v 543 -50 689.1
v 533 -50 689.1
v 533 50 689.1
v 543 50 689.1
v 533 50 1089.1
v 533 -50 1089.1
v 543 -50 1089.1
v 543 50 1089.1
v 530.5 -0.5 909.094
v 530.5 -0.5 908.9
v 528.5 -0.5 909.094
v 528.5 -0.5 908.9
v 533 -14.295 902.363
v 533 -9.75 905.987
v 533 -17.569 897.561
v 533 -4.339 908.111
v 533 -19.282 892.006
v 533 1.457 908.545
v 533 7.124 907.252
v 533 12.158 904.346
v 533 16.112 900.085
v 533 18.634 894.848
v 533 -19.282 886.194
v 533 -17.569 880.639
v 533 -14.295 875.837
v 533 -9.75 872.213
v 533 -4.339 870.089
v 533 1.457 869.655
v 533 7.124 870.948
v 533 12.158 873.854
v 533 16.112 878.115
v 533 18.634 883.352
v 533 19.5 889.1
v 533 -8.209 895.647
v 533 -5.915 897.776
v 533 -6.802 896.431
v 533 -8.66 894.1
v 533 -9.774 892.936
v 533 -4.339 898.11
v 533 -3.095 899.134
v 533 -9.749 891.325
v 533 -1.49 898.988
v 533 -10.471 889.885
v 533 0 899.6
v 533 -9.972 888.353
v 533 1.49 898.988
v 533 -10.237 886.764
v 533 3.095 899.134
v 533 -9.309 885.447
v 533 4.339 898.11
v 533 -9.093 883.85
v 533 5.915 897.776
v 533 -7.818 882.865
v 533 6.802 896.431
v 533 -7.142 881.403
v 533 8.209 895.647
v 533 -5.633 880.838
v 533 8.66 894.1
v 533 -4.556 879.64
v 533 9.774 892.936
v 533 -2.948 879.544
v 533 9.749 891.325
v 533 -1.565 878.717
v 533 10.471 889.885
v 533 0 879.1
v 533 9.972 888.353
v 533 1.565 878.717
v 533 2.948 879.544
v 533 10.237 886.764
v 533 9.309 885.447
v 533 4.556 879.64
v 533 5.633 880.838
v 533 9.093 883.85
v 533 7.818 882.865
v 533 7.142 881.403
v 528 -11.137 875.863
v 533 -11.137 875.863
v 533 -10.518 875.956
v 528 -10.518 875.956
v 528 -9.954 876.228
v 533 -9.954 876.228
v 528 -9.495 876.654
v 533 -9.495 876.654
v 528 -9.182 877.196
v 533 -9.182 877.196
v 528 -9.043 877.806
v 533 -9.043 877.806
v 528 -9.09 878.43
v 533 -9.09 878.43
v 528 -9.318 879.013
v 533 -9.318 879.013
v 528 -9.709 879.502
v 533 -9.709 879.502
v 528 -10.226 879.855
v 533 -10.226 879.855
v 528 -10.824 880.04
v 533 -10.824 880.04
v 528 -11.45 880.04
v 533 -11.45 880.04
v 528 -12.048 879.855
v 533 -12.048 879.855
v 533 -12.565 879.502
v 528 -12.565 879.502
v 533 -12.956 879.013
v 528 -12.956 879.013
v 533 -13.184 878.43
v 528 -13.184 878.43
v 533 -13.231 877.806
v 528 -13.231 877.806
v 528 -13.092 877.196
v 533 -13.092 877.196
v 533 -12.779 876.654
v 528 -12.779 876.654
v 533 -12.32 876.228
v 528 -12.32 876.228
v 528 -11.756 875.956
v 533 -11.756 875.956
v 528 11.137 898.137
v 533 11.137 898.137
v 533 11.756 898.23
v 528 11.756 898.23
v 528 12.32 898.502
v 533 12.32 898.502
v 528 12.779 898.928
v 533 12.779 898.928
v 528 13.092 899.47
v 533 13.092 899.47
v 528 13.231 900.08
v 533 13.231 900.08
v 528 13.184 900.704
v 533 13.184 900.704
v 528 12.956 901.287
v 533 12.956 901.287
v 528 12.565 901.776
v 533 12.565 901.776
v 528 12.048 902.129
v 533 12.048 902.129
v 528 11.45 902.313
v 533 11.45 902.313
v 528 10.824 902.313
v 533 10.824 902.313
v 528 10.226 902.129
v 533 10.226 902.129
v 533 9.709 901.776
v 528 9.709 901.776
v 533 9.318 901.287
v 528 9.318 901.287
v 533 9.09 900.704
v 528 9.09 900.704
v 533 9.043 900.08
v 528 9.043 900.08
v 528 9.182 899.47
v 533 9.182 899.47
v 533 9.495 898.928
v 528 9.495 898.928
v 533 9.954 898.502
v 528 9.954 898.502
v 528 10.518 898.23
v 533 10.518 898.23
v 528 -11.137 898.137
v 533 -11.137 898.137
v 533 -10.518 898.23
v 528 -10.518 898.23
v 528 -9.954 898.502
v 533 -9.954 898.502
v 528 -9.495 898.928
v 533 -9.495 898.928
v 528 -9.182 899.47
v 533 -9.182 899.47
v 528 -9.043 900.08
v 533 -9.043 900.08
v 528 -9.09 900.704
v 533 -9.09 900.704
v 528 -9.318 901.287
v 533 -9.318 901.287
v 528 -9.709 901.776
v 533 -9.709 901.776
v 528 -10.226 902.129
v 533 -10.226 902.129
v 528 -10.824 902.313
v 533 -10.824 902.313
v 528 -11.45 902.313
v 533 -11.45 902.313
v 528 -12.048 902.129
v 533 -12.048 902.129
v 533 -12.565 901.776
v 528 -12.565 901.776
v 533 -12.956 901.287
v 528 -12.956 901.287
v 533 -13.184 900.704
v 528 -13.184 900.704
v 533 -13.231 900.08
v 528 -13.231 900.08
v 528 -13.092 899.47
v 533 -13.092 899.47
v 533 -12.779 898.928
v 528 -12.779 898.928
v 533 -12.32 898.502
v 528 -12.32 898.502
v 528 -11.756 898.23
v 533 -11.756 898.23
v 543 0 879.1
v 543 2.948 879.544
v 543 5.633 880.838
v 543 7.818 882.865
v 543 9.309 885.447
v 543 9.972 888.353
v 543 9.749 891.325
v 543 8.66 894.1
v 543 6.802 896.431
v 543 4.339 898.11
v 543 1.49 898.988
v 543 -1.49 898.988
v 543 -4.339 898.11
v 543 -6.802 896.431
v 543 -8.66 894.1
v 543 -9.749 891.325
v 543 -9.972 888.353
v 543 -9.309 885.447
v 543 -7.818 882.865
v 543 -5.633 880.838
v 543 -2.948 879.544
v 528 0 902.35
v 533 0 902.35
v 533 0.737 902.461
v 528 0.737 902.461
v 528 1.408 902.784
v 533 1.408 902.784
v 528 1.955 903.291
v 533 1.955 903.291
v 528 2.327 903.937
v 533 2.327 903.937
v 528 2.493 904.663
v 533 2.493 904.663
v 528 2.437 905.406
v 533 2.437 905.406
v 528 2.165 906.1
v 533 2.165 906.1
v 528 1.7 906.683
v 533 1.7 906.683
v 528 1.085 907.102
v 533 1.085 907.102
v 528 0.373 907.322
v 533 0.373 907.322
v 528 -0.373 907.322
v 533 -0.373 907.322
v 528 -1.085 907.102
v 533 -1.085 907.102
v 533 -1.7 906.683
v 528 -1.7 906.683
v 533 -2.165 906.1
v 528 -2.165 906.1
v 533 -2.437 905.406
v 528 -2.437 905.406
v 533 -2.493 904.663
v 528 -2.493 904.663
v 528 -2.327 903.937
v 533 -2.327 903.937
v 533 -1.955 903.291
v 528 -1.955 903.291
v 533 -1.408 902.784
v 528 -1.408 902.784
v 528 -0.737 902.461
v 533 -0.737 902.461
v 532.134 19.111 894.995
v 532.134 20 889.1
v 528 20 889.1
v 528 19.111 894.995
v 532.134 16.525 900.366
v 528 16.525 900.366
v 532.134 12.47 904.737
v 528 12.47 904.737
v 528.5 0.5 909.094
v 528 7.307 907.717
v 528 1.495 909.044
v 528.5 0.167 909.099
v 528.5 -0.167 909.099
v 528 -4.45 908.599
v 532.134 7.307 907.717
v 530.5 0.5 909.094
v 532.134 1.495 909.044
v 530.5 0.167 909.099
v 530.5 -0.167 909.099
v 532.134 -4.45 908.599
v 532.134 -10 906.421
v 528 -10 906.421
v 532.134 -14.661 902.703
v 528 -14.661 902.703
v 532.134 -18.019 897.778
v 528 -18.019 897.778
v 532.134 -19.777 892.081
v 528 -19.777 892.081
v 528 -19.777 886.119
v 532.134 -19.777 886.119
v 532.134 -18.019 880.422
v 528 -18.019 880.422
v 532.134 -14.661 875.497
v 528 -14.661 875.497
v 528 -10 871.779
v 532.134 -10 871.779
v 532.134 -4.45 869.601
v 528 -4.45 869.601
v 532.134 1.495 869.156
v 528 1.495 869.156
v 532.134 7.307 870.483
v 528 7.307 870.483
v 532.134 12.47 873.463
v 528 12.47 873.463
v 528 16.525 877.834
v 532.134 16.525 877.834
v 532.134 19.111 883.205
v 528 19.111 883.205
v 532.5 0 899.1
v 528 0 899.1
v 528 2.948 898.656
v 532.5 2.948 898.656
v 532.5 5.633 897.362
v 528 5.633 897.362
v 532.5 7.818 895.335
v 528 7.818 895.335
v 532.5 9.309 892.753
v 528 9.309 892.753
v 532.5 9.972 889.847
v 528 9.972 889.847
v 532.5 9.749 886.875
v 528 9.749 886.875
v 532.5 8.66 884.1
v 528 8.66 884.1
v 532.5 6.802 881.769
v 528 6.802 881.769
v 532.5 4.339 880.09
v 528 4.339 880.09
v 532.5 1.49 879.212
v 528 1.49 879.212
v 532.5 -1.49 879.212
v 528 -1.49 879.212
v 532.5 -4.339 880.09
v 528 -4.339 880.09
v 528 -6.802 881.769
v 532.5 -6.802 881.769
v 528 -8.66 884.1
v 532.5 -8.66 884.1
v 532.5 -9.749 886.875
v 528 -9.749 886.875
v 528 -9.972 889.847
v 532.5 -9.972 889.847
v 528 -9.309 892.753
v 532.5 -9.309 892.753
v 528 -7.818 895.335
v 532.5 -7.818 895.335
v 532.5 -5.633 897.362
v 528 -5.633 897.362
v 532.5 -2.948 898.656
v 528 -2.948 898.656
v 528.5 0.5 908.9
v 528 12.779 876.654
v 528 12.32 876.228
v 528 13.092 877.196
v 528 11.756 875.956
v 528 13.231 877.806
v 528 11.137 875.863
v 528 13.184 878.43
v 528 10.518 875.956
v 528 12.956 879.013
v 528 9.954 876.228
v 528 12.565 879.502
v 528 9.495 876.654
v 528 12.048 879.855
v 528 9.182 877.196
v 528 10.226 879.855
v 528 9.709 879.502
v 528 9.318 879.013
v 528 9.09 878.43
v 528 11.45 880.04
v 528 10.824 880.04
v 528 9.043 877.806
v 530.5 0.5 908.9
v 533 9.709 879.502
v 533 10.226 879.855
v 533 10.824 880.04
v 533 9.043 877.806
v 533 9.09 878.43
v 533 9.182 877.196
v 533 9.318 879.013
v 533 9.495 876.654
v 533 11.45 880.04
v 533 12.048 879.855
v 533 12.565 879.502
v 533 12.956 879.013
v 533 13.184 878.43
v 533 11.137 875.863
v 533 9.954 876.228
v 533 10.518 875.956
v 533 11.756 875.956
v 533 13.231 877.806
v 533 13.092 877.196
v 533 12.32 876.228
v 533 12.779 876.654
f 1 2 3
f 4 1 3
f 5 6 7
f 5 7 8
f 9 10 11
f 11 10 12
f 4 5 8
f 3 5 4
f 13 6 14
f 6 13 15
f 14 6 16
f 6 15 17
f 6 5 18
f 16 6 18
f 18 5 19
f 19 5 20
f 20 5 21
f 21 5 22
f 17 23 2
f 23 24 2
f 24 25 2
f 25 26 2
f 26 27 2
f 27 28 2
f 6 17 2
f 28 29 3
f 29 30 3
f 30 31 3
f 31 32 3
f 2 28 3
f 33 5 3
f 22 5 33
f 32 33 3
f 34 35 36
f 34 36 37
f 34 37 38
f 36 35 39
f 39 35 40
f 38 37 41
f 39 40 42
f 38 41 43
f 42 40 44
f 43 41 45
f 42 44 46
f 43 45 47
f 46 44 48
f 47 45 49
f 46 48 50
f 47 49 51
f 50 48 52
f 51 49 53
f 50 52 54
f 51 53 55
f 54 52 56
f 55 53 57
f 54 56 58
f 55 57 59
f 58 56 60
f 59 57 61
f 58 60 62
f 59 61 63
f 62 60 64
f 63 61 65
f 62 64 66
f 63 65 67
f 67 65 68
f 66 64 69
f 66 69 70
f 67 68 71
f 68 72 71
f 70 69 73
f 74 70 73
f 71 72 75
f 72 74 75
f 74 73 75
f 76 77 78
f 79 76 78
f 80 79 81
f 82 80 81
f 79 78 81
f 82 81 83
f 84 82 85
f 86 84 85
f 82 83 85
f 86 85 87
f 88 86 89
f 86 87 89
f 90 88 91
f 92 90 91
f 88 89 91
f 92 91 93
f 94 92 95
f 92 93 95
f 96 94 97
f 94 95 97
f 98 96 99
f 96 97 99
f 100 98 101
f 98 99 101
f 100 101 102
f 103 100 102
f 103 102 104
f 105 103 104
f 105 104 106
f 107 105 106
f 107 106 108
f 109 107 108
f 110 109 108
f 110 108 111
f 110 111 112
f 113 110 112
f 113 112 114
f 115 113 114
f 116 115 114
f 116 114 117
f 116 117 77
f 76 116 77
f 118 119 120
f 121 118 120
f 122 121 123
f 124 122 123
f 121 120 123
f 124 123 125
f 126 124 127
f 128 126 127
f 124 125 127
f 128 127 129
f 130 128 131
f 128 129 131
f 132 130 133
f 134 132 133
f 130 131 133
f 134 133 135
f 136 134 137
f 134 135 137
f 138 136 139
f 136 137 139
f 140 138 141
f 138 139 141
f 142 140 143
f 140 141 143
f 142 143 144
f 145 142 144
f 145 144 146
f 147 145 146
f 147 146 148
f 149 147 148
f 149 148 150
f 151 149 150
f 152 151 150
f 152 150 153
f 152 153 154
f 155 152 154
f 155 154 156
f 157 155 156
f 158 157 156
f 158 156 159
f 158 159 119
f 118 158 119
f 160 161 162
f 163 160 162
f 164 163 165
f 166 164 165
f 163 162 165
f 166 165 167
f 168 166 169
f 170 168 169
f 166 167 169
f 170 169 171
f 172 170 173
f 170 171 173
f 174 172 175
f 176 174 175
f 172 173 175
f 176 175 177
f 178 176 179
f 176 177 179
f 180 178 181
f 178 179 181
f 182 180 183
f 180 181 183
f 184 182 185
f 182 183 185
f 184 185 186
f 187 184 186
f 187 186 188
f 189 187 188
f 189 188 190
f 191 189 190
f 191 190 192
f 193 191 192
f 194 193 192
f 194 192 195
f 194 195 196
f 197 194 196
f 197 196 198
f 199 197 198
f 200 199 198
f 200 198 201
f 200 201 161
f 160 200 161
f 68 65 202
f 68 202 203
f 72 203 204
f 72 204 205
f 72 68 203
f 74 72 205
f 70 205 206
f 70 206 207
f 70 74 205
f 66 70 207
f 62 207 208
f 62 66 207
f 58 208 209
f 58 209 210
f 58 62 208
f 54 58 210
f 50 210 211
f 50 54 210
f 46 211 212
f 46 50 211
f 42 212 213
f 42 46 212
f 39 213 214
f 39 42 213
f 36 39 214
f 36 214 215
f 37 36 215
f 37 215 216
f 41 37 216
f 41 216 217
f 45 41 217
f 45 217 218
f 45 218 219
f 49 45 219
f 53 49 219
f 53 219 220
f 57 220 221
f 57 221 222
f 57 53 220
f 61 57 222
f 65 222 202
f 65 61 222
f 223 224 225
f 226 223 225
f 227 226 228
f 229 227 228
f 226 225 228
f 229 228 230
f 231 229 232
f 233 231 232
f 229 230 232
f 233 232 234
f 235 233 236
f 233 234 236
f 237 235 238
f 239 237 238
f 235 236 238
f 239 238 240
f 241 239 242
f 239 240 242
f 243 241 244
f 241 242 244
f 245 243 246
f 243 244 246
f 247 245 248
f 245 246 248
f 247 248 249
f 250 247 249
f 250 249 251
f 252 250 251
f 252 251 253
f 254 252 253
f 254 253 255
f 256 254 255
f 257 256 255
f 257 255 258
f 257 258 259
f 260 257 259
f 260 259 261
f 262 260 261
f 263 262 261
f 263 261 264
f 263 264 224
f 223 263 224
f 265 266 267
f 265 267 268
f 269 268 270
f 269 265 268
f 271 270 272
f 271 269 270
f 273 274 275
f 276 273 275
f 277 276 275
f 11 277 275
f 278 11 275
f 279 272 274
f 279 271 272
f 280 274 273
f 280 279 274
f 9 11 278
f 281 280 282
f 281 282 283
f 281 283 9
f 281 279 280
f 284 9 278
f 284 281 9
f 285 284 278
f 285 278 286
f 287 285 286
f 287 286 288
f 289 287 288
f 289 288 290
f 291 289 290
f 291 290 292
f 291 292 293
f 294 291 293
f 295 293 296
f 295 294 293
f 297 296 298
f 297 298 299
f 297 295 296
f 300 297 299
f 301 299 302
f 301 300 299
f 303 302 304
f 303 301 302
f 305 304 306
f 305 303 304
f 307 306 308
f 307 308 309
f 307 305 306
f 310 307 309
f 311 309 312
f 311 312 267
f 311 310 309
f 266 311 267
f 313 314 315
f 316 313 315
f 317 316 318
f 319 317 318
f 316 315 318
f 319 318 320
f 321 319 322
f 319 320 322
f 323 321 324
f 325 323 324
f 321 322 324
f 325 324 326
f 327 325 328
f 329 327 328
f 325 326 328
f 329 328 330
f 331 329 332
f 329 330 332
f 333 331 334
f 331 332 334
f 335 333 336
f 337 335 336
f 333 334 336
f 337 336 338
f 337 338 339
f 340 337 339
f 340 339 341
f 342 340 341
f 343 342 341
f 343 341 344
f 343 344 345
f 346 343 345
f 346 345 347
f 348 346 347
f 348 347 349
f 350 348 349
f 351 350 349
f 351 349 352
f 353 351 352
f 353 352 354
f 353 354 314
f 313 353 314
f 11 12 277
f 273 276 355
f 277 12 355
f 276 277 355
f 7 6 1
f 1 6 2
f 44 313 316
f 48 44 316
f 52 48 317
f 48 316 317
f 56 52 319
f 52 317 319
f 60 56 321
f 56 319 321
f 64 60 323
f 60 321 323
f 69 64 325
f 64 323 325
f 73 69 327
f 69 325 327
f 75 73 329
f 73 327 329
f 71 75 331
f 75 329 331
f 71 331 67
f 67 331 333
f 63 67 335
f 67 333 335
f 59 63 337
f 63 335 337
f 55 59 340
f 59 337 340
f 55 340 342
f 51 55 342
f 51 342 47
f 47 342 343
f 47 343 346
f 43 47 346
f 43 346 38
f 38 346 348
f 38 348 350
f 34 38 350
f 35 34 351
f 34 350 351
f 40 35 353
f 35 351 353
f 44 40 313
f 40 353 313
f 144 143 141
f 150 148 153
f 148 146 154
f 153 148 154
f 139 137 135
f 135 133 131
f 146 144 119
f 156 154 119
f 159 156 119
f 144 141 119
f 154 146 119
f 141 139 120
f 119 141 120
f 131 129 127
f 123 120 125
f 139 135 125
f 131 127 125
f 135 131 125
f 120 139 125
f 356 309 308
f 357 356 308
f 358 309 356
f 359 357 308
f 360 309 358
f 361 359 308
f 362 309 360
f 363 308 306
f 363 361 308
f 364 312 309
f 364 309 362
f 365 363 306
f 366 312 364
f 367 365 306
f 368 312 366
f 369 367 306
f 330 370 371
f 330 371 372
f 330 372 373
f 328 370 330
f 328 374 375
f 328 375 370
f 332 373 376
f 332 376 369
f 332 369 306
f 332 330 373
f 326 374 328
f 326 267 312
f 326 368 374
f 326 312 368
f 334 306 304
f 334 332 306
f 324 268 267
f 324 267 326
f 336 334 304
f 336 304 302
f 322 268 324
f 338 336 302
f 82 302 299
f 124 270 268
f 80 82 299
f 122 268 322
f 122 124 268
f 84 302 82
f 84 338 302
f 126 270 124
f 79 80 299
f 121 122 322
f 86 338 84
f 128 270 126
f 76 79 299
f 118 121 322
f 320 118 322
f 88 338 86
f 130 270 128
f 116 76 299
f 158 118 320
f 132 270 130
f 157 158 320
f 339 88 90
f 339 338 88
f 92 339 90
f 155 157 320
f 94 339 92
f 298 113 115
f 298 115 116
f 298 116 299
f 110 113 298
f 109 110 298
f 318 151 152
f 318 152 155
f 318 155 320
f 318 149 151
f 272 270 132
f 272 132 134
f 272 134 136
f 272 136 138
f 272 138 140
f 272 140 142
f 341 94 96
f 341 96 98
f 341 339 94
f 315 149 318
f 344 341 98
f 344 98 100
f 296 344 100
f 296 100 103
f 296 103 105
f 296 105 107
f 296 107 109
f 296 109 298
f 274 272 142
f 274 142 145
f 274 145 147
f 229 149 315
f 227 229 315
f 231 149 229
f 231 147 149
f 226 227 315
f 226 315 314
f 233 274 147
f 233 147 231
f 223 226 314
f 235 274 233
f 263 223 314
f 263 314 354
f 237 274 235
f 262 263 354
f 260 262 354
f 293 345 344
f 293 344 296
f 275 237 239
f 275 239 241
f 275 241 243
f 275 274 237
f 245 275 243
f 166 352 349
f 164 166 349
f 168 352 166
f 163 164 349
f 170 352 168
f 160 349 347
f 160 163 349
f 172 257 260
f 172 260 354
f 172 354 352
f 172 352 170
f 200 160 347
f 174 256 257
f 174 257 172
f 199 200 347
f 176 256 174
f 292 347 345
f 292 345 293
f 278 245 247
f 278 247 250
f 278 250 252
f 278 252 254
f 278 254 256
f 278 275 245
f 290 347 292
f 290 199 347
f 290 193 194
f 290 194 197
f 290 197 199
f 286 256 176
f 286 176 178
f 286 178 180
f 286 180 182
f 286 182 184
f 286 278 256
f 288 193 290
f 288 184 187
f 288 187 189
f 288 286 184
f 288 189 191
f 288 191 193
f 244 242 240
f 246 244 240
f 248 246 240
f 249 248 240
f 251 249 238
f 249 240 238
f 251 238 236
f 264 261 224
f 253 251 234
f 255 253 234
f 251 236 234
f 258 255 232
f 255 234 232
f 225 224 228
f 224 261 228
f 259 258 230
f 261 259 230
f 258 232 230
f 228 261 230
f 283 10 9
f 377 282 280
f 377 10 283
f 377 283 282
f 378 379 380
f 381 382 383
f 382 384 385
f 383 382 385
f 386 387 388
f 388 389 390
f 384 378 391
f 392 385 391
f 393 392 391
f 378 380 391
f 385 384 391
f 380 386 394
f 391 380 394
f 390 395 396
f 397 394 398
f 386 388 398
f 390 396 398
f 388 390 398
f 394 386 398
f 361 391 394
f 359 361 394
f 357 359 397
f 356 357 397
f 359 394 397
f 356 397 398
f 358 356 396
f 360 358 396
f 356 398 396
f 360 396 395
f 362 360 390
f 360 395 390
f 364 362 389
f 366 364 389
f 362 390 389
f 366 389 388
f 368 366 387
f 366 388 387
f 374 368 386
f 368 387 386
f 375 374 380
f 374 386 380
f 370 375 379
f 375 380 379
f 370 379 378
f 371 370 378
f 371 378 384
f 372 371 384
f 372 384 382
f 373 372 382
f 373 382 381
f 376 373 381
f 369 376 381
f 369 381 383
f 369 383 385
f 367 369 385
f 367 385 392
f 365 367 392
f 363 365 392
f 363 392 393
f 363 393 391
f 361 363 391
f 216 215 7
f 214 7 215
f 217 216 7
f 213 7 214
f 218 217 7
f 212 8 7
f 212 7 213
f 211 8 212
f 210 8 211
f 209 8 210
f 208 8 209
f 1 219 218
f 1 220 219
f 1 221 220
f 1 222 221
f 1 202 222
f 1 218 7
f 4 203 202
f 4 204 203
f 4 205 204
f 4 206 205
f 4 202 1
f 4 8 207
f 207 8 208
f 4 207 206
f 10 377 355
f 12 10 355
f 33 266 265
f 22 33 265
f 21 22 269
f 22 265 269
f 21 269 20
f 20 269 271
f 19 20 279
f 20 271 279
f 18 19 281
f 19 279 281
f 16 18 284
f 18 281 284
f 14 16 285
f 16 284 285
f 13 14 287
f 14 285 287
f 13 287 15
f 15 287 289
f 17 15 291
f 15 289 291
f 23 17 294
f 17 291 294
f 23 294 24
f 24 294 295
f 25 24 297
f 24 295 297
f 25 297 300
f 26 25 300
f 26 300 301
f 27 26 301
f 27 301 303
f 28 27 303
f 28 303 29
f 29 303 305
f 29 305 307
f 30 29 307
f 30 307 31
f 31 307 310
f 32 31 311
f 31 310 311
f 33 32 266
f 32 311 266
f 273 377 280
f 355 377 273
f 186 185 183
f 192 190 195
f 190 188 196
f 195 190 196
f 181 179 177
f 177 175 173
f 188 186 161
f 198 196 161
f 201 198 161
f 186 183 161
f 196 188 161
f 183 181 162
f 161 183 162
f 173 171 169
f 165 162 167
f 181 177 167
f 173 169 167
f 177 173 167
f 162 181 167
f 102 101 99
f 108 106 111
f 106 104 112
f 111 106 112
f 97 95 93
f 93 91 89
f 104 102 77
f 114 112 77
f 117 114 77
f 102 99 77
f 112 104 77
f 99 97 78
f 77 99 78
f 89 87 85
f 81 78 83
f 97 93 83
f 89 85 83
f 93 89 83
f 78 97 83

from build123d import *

# Parameters (mm, degrees)
SKETCH1_W                      = 5
SKETCH1_H                      = 20
CUT_EXTRUDE1_REACH             = 2.2
SKETCH2_W                      = 2
SKETCH2_H                      = 1
F_20_0_20_DIAMETER_HOLE1_D     = 20
F_20_0_20_DIAMETER_HOLE1_DEPTH = 5
F_5_0_5_DIAMETER_HOLE1_D       = 5
F_5_0_5_DIAMETER_HOLE1_DEPTH   = 5
F_4_2_4_2_DIAMETER_HOLE1_D     = 4.2
F_4_2_4_2_DIAMETER_HOLE1_DEPTH = 5
CHAMFER1_SIZE                  = 0.5
CHAMFER1_SIZE2                 = 0.866025404
CHAMFER2_SIZE                  = 0.5
SKETCH9_W                      = 400
SKETCH9_H                      = 100
SKETCH9_R                      = 10
BOSS_EXTRUDE1_DEPTH            = 10


with BuildPart() as part:
    # Sketch1 → Revolve1 (revolve)
    with BuildSketch(Plane.XY.offset(889.1)):
        with Locations((530.5, 10)):
            Rectangle(SKETCH1_W, SKETCH1_H)
    revolve(axis=Axis((528, 0, 889.1), (1, 0, 0)))

    # Sketch2 → Cut-Extrude1 (cut, up to next)
    with BuildSketch(Plane(origin=(0, 0, 908.9), x_dir=(-1, 0, 0), z_dir=(0, 0, -1)), mode=Mode.PRIVATE) as cut_extrude1_sk1:
        with Locations((-529.5, 0)):
            Rectangle(SKETCH2_W, SKETCH2_H)
    cut_extrude1_tool1 = extrude(cut_extrude1_sk1.sketch, amount=-CUT_EXTRUDE1_REACH, mode=Mode.PRIVATE) & part.part
    add(cut_extrude1_tool1.solids().sort_by_distance((529.5, 0, 908.9))[0], mode=Mode.SUBTRACT)

    # Ø20.0 (20) Diameter Hole1
    with Locations(Plane(origin=(533, 0, 0), x_dir=(0, 0, -1), z_dir=(1, 0, 0))):
        with Locations((-889.1, 0)):
            Hole(F_20_0_20_DIAMETER_HOLE1_D / 2, depth=F_20_0_20_DIAMETER_HOLE1_DEPTH)

    # Ø5.0 (5) Diameter Hole1
    with Locations(Plane.ZY.offset(-528)):
        with Locations((904.85, 0)):
            Hole(F_5_0_5_DIAMETER_HOLE1_D / 2, depth=F_5_0_5_DIAMETER_HOLE1_DEPTH)

    # Ø4.2 (4.2) Diameter Hole1
    with Locations(Plane.ZY.offset(-528)):
        with Locations((900.236931804, 11.136931804), (877.963068196, -11.136931804), (877.963068196, 11.136931804), (900.236931804, -11.136931804)):
            Hole(F_4_2_4_2_DIAMETER_HOLE1_D / 2, depth=F_4_2_4_2_DIAMETER_HOLE1_DEPTH)

    # Chamfer1
    chamfer1_edges = [part.edges().sort_by_distance(p)[0] for p in [
        (533, -20, 889.1),
    ]]
    chamfer1_side = [part.faces().sort_by_distance(p)[0] for p in [
        (533, -19.434314575, 889.1),
    ]]
    chamfer(chamfer1_edges, length=CHAMFER1_SIZE, length2=CHAMFER1_SIZE2, reference=chamfer1_side[0])

    # Chamfer2
    chamfer2_edges = [part.edges().sort_by_distance(p)[0] for p in [
        (533, 0, 879.1),
    ]]
    chamfer(chamfer2_edges, length=CHAMFER2_SIZE)

    # Sketch9 → Boss-Extrude1 (add)
    with BuildSketch(Plane(origin=(533, 0, 0), x_dir=(0, 0, -1), z_dir=(1, 0, 0))):
        with Locations((-889.1, 0)):
            Rectangle(SKETCH9_W, SKETCH9_H)
        with Locations((-889.1, 0)):
            Circle(SKETCH9_R, mode=Mode.SUBTRACT)
    extrude(amount=BOSS_EXTRUDE1_DEPTH)


solid = part.part
